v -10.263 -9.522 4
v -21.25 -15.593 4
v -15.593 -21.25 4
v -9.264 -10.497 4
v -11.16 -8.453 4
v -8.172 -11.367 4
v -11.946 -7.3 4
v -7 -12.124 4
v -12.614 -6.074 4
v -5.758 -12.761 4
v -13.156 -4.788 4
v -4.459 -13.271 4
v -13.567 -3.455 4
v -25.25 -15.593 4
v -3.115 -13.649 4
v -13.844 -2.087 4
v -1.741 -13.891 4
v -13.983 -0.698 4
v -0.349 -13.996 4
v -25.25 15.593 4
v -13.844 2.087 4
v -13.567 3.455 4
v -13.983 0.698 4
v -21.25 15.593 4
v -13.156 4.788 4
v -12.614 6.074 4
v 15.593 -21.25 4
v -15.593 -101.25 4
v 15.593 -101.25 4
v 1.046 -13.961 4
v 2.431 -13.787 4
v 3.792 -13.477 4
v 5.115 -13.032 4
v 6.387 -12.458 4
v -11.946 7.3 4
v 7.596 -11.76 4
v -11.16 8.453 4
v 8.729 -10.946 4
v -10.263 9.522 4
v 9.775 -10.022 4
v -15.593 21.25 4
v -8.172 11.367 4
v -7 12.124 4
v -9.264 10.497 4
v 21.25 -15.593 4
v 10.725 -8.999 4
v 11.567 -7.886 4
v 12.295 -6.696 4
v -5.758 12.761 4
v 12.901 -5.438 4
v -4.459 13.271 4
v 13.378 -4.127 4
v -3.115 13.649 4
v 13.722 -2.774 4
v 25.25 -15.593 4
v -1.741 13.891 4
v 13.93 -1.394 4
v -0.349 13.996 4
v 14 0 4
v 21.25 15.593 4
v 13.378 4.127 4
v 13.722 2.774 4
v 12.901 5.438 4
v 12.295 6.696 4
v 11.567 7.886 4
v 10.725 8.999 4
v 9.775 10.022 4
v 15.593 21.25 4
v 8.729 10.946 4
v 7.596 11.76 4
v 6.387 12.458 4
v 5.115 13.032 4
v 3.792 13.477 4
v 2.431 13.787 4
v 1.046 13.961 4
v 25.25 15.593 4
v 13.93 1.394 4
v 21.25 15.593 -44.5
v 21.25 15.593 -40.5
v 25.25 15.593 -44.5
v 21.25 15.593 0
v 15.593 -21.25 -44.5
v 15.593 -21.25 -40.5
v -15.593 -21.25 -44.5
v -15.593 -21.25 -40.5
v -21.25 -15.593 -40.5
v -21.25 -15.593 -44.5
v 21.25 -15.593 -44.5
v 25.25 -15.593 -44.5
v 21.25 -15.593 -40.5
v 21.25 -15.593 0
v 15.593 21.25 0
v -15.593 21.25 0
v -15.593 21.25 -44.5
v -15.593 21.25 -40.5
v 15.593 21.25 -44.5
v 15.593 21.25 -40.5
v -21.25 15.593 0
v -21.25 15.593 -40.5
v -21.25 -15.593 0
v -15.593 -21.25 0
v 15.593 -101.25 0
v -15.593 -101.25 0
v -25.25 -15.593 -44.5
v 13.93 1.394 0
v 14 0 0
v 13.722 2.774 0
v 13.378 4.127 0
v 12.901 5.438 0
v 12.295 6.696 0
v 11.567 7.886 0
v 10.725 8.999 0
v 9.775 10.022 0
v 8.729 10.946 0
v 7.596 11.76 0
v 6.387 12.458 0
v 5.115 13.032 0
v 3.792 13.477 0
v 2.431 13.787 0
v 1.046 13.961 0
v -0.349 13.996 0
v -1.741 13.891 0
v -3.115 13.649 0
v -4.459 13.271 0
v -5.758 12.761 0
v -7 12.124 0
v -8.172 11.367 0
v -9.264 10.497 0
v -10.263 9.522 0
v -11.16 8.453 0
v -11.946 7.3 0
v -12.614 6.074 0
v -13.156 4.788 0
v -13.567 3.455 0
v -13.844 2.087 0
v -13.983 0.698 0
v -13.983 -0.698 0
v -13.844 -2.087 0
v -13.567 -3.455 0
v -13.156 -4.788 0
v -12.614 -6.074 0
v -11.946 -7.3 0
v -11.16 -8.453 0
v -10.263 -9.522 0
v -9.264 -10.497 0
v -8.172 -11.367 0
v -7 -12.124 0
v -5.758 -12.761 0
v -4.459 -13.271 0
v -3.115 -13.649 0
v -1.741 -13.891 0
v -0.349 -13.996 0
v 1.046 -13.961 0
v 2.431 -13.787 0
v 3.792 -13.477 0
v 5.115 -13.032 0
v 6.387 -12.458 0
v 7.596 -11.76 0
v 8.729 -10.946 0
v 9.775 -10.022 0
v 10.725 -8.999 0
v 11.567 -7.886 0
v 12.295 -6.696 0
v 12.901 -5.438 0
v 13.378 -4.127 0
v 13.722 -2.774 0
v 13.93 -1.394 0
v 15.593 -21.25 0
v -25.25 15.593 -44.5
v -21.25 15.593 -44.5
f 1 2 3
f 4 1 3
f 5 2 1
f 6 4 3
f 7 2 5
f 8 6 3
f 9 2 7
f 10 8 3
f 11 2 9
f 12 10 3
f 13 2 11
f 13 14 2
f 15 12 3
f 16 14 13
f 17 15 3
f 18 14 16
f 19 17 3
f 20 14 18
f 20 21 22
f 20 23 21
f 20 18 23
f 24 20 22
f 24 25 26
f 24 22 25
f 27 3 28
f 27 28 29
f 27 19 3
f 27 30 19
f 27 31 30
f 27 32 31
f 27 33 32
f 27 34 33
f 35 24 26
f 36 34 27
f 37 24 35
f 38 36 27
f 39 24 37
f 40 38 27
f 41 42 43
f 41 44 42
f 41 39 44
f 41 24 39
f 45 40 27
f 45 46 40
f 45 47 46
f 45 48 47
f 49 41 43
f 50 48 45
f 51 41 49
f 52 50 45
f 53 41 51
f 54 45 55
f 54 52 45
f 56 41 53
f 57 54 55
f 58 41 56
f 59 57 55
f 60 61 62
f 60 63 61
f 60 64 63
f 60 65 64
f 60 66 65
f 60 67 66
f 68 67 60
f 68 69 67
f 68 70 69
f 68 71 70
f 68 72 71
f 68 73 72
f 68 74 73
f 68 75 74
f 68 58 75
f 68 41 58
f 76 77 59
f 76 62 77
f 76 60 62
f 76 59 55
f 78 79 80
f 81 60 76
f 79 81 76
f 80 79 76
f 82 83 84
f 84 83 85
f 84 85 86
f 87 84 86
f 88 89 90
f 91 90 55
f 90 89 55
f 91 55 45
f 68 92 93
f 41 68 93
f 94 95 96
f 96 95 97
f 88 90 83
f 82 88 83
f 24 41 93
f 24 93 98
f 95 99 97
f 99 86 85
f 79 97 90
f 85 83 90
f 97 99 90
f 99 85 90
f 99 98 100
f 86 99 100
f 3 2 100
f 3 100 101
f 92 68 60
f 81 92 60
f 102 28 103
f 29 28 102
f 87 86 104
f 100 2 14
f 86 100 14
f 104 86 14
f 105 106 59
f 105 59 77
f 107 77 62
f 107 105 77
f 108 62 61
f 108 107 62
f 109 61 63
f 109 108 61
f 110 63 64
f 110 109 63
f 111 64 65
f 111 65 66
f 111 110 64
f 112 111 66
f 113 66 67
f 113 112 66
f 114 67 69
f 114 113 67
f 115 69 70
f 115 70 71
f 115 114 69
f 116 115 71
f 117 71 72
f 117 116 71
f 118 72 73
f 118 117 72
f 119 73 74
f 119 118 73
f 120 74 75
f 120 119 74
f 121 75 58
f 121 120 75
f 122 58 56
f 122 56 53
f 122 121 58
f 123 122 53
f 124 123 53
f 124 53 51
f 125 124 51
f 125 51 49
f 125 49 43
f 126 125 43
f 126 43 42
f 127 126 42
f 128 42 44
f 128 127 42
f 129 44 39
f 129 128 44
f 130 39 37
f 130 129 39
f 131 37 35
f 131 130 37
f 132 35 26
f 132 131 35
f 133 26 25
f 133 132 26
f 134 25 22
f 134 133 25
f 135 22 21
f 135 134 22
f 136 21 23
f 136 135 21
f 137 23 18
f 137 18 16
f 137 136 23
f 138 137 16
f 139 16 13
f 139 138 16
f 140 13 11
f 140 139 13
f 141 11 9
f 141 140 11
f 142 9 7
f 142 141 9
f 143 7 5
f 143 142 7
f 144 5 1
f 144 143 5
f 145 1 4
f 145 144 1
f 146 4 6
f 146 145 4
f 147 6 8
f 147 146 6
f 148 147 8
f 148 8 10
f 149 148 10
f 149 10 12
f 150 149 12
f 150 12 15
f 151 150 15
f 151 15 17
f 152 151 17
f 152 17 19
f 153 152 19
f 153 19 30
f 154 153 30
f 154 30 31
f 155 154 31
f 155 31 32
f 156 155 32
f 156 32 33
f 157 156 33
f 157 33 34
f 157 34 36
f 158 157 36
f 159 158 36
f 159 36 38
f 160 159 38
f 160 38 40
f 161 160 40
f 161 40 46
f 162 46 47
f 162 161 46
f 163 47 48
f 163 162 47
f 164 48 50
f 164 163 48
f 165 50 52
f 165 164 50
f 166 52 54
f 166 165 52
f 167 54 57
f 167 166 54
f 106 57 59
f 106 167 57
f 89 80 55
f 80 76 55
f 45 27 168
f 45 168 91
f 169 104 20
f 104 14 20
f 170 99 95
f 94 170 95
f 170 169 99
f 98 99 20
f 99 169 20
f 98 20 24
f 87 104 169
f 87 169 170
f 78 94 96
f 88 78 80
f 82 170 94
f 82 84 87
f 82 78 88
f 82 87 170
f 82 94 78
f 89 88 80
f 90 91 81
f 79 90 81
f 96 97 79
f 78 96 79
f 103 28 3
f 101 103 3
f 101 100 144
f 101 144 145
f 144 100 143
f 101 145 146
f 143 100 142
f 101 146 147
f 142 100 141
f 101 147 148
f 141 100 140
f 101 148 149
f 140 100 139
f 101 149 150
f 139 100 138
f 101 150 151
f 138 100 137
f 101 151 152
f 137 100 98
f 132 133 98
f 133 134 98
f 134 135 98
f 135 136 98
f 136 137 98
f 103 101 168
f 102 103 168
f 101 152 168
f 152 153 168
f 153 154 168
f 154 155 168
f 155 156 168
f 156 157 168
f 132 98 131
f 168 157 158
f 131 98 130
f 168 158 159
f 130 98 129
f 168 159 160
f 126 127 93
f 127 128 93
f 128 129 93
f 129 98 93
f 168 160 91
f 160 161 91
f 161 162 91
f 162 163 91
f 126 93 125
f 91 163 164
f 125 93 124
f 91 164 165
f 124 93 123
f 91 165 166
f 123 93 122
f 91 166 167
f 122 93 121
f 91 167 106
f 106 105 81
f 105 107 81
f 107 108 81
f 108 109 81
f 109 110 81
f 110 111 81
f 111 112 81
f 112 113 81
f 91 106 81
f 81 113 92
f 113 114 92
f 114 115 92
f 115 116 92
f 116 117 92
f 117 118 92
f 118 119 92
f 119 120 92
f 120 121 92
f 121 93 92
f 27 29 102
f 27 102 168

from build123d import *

# Parameters (mm, degrees)
SKETCH1_W           = 42.5
SKETCH1_H           = 42.5
SKETCH1_R           = 14
BOSS_EXTRUDE1_DEPTH = 4
CUT_EXTRUDE1_DEPTH  = 10
SKETCH3_W           = 31.186291502
SKETCH3_H           = 44.5
BOSS_EXTRUDE2_DEPTH = 4
SKETCH4_W           = 31.186291502
SKETCH4_H           = 44.5
BOSS_EXTRUDE3_DEPTH = 4
BOSS_EXTRUDE5_DEPTH = 4
SKETCH8_W           = 31.186291502
SKETCH8_H           = 80
BOSS_EXTRUDE6_DEPTH = 4


with BuildPart() as part:
    # Sketch1 → Boss-Extrude1 (new body)
    with BuildSketch(Plane(origin=(0, 0, 0), x_dir=(0, 1, 0), z_dir=(0, 0, 1))):
        Rectangle(SKETCH1_W, SKETCH1_H)
        with Locations(Location((0, 0, 0), (0, 0, 270))):
            Circle(SKETCH1_R, mode=Mode.SUBTRACT)
    extrude(amount=BOSS_EXTRUDE1_DEPTH)

    # Sketch2 → Cut-Extrude1 (cut)
    with BuildSketch(Plane.XY.offset(4)):
        Polygon((-15.593145751, 21.25), (-21.25, 15.593145751), (-21.25, 21.25), align=None)
        Polygon((-21.25, -15.593145751), (-15.593145751, -21.25), (-21.25, -21.25), align=None)
        Polygon((15.593145751, -21.25), (21.25, -15.593145751), (21.25, -21.25), align=None)
        Polygon((15.593145751, 21.25), (21.25, 15.593145751), (21.25, 21.25), align=None)
    extrude(amount=-CUT_EXTRUDE1_DEPTH, mode=Mode.SUBTRACT)

    # Sketch3 → Boss-Extrude2 (add)
    with BuildSketch(Plane(origin=(-21.25, 0, 0), x_dir=(0, -1, 0), z_dir=(-1, 0, 0))):
        with Locations((0, -18.25)):
            Rectangle(SKETCH3_W, SKETCH3_H)
    extrude(amount=BOSS_EXTRUDE2_DEPTH)

    # Sketch4 → Boss-Extrude3 (add)
    with BuildSketch(Plane.YZ.offset(21.25)):
        with Locations((0, -18.25)):
            Rectangle(SKETCH4_W, SKETCH4_H)
    extrude(amount=BOSS_EXTRUDE3_DEPTH)

    # Sketch6 → Boss-Extrude5 (add)
    with BuildSketch(Plane(origin=(0, 0, -40.5), x_dir=(1, 0, 0), z_dir=(0, 0, -1))):
        Polygon((-21.25, 15.593145751), (-25.25, 15.593145751), (-25.25, -15.593145751), (-21.25, -15.593145751), (-15.593145751, -21.25), (15.593145751, -21.25), (21.25, -15.593145751), (25.25, -15.593145751), (25.25, 15.593145751), (21.25, 15.593145751), (15.593145751, 21.25), (-15.593145751, 21.25), align=None)
    extrude(amount=BOSS_EXTRUDE5_DEPTH)

    # Sketch8 → Boss-Extrude6 (add)
    with BuildSketch(Plane.XY.offset(4)):
        with Locations((0, -61.25)):
            Rectangle(SKETCH8_W, SKETCH8_H)
    extrude(amount=-BOSS_EXTRUDE6_DEPTH)


solid = part.part
